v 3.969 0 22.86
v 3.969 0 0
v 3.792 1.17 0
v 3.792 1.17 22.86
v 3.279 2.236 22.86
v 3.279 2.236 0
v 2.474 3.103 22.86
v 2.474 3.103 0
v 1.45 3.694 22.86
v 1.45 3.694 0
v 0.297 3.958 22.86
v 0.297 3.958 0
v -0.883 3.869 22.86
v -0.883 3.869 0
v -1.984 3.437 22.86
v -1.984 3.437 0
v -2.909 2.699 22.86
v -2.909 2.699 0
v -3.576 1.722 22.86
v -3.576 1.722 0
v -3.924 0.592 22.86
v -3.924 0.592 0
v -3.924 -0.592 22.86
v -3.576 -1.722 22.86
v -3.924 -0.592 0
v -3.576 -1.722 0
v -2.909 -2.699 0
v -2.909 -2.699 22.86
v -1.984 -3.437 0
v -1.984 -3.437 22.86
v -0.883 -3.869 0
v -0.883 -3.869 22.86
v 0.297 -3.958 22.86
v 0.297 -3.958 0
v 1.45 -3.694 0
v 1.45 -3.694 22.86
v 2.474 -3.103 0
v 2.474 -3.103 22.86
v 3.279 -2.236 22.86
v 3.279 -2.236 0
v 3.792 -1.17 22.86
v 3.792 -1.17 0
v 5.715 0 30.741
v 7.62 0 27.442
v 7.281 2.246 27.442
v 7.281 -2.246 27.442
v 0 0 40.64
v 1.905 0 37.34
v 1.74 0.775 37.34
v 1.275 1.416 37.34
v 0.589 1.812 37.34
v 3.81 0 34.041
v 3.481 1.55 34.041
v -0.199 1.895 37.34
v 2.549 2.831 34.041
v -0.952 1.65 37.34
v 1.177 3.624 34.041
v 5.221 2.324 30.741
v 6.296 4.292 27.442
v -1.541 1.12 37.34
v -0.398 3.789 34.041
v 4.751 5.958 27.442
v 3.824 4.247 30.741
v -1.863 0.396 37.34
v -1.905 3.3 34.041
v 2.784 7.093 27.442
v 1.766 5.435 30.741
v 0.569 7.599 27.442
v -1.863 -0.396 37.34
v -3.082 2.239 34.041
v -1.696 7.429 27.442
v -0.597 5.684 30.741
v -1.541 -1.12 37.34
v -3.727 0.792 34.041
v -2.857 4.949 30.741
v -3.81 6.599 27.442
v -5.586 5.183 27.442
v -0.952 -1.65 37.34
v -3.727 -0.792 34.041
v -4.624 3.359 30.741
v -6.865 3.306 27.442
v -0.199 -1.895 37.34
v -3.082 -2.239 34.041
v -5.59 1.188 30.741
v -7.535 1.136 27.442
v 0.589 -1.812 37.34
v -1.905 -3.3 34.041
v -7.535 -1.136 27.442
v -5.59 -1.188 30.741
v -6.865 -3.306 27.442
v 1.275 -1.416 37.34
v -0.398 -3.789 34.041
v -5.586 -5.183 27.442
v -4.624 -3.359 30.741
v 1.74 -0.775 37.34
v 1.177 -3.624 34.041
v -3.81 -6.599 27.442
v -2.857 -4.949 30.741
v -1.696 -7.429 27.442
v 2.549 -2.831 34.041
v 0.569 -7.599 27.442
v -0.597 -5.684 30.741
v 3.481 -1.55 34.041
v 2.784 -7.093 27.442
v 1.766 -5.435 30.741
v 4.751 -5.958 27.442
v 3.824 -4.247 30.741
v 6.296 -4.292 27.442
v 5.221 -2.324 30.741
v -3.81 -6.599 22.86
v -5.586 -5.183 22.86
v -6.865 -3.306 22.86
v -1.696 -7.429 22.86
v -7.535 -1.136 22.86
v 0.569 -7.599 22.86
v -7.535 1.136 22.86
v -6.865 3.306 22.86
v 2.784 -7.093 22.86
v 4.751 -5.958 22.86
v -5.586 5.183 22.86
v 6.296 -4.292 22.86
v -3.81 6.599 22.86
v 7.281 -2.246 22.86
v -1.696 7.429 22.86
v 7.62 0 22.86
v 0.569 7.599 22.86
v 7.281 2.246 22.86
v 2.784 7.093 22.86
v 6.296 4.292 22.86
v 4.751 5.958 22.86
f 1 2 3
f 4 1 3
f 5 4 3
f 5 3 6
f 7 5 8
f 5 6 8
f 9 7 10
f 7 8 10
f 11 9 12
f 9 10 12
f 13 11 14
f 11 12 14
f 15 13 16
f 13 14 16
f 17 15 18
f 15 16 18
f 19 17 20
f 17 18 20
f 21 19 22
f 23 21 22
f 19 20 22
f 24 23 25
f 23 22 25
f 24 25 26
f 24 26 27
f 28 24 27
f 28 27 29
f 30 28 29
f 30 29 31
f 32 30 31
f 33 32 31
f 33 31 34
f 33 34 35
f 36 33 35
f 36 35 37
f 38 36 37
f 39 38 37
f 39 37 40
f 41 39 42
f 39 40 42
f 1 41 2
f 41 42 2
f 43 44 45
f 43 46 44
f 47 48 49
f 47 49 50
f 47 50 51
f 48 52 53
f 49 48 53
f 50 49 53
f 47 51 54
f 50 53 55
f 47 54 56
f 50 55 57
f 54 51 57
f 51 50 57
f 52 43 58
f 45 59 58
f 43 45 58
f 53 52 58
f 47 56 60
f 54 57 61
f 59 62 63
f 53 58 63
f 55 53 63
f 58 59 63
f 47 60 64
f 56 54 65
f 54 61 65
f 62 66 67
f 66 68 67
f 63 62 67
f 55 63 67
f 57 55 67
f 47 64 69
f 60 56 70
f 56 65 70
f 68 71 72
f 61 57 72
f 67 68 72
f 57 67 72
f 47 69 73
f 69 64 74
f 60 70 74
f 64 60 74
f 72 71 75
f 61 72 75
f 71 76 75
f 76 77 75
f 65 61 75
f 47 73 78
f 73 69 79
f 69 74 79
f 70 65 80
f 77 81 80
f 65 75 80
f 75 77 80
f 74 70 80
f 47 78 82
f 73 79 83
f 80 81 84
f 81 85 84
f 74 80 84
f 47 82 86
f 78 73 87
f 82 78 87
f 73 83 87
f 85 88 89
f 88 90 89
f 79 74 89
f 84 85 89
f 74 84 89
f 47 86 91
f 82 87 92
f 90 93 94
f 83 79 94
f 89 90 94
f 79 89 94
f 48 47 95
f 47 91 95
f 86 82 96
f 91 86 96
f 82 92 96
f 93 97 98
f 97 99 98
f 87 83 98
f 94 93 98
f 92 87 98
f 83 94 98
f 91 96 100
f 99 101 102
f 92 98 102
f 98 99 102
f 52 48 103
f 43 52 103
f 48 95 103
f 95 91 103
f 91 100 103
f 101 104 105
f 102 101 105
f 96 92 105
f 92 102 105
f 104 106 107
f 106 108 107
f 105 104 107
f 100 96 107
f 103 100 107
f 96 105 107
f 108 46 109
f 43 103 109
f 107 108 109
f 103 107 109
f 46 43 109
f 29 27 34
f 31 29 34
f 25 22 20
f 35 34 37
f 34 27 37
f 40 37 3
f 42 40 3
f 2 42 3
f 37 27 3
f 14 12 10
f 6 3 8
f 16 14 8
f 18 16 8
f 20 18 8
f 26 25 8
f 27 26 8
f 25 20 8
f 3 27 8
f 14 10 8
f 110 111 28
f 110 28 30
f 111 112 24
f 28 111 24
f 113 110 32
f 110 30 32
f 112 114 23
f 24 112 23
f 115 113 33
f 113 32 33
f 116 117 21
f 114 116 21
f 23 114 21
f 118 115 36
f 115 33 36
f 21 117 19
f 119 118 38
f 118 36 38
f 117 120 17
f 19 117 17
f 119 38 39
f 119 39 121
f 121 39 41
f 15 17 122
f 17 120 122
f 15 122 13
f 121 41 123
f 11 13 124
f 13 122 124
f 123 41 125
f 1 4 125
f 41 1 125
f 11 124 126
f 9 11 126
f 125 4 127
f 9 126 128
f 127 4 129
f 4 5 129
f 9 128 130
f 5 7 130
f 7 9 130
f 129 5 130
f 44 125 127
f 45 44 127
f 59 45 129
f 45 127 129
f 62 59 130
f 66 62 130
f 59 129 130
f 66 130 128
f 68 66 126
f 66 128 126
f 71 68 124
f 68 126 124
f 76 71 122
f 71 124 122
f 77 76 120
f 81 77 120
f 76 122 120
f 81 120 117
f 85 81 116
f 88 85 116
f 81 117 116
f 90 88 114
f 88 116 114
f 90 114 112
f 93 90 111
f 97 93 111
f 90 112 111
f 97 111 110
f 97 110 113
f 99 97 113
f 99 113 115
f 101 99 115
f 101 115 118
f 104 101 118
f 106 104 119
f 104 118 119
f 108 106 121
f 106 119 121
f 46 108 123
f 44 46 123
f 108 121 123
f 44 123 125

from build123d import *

# Parameters (mm, degrees)
F0_R     = 3.96875
F1_DEPTH = 22.86
F2_R     = 7.62
F2_R_2   = 3.96875
F3_DEPTH = 17.78
F4_SIZE2 = 13.1982271537
F4_SIZE  = 7.62


with BuildPart() as f1:
    # F0 (on Top) → F1 (new body)
    with BuildSketch(Plane.XY):
        Circle(F0_R)
    extrude(amount=F1_DEPTH)

    # F2 (on face) → F3 (join)
    with BuildSketch(Plane.XY.offset(22.86)):
        Circle(F2_R)
        Circle(F2_R_2, mode=Mode.SUBTRACT)
        Circle(F2_R_2)
    extrude(amount=F3_DEPTH)

    # F4
    f4_edges = [f1.edges().sort_by_distance(p)[0] for p in [
        (-7.62, 0, 40.64),
    ]]
    f4_side = f1.faces().sort_by_distance((0, 0, 40.64))[0]
    chamfer(f4_edges, length=F4_SIZE, length2=F4_SIZE2, reference=f4_side)


solid = f1.part
